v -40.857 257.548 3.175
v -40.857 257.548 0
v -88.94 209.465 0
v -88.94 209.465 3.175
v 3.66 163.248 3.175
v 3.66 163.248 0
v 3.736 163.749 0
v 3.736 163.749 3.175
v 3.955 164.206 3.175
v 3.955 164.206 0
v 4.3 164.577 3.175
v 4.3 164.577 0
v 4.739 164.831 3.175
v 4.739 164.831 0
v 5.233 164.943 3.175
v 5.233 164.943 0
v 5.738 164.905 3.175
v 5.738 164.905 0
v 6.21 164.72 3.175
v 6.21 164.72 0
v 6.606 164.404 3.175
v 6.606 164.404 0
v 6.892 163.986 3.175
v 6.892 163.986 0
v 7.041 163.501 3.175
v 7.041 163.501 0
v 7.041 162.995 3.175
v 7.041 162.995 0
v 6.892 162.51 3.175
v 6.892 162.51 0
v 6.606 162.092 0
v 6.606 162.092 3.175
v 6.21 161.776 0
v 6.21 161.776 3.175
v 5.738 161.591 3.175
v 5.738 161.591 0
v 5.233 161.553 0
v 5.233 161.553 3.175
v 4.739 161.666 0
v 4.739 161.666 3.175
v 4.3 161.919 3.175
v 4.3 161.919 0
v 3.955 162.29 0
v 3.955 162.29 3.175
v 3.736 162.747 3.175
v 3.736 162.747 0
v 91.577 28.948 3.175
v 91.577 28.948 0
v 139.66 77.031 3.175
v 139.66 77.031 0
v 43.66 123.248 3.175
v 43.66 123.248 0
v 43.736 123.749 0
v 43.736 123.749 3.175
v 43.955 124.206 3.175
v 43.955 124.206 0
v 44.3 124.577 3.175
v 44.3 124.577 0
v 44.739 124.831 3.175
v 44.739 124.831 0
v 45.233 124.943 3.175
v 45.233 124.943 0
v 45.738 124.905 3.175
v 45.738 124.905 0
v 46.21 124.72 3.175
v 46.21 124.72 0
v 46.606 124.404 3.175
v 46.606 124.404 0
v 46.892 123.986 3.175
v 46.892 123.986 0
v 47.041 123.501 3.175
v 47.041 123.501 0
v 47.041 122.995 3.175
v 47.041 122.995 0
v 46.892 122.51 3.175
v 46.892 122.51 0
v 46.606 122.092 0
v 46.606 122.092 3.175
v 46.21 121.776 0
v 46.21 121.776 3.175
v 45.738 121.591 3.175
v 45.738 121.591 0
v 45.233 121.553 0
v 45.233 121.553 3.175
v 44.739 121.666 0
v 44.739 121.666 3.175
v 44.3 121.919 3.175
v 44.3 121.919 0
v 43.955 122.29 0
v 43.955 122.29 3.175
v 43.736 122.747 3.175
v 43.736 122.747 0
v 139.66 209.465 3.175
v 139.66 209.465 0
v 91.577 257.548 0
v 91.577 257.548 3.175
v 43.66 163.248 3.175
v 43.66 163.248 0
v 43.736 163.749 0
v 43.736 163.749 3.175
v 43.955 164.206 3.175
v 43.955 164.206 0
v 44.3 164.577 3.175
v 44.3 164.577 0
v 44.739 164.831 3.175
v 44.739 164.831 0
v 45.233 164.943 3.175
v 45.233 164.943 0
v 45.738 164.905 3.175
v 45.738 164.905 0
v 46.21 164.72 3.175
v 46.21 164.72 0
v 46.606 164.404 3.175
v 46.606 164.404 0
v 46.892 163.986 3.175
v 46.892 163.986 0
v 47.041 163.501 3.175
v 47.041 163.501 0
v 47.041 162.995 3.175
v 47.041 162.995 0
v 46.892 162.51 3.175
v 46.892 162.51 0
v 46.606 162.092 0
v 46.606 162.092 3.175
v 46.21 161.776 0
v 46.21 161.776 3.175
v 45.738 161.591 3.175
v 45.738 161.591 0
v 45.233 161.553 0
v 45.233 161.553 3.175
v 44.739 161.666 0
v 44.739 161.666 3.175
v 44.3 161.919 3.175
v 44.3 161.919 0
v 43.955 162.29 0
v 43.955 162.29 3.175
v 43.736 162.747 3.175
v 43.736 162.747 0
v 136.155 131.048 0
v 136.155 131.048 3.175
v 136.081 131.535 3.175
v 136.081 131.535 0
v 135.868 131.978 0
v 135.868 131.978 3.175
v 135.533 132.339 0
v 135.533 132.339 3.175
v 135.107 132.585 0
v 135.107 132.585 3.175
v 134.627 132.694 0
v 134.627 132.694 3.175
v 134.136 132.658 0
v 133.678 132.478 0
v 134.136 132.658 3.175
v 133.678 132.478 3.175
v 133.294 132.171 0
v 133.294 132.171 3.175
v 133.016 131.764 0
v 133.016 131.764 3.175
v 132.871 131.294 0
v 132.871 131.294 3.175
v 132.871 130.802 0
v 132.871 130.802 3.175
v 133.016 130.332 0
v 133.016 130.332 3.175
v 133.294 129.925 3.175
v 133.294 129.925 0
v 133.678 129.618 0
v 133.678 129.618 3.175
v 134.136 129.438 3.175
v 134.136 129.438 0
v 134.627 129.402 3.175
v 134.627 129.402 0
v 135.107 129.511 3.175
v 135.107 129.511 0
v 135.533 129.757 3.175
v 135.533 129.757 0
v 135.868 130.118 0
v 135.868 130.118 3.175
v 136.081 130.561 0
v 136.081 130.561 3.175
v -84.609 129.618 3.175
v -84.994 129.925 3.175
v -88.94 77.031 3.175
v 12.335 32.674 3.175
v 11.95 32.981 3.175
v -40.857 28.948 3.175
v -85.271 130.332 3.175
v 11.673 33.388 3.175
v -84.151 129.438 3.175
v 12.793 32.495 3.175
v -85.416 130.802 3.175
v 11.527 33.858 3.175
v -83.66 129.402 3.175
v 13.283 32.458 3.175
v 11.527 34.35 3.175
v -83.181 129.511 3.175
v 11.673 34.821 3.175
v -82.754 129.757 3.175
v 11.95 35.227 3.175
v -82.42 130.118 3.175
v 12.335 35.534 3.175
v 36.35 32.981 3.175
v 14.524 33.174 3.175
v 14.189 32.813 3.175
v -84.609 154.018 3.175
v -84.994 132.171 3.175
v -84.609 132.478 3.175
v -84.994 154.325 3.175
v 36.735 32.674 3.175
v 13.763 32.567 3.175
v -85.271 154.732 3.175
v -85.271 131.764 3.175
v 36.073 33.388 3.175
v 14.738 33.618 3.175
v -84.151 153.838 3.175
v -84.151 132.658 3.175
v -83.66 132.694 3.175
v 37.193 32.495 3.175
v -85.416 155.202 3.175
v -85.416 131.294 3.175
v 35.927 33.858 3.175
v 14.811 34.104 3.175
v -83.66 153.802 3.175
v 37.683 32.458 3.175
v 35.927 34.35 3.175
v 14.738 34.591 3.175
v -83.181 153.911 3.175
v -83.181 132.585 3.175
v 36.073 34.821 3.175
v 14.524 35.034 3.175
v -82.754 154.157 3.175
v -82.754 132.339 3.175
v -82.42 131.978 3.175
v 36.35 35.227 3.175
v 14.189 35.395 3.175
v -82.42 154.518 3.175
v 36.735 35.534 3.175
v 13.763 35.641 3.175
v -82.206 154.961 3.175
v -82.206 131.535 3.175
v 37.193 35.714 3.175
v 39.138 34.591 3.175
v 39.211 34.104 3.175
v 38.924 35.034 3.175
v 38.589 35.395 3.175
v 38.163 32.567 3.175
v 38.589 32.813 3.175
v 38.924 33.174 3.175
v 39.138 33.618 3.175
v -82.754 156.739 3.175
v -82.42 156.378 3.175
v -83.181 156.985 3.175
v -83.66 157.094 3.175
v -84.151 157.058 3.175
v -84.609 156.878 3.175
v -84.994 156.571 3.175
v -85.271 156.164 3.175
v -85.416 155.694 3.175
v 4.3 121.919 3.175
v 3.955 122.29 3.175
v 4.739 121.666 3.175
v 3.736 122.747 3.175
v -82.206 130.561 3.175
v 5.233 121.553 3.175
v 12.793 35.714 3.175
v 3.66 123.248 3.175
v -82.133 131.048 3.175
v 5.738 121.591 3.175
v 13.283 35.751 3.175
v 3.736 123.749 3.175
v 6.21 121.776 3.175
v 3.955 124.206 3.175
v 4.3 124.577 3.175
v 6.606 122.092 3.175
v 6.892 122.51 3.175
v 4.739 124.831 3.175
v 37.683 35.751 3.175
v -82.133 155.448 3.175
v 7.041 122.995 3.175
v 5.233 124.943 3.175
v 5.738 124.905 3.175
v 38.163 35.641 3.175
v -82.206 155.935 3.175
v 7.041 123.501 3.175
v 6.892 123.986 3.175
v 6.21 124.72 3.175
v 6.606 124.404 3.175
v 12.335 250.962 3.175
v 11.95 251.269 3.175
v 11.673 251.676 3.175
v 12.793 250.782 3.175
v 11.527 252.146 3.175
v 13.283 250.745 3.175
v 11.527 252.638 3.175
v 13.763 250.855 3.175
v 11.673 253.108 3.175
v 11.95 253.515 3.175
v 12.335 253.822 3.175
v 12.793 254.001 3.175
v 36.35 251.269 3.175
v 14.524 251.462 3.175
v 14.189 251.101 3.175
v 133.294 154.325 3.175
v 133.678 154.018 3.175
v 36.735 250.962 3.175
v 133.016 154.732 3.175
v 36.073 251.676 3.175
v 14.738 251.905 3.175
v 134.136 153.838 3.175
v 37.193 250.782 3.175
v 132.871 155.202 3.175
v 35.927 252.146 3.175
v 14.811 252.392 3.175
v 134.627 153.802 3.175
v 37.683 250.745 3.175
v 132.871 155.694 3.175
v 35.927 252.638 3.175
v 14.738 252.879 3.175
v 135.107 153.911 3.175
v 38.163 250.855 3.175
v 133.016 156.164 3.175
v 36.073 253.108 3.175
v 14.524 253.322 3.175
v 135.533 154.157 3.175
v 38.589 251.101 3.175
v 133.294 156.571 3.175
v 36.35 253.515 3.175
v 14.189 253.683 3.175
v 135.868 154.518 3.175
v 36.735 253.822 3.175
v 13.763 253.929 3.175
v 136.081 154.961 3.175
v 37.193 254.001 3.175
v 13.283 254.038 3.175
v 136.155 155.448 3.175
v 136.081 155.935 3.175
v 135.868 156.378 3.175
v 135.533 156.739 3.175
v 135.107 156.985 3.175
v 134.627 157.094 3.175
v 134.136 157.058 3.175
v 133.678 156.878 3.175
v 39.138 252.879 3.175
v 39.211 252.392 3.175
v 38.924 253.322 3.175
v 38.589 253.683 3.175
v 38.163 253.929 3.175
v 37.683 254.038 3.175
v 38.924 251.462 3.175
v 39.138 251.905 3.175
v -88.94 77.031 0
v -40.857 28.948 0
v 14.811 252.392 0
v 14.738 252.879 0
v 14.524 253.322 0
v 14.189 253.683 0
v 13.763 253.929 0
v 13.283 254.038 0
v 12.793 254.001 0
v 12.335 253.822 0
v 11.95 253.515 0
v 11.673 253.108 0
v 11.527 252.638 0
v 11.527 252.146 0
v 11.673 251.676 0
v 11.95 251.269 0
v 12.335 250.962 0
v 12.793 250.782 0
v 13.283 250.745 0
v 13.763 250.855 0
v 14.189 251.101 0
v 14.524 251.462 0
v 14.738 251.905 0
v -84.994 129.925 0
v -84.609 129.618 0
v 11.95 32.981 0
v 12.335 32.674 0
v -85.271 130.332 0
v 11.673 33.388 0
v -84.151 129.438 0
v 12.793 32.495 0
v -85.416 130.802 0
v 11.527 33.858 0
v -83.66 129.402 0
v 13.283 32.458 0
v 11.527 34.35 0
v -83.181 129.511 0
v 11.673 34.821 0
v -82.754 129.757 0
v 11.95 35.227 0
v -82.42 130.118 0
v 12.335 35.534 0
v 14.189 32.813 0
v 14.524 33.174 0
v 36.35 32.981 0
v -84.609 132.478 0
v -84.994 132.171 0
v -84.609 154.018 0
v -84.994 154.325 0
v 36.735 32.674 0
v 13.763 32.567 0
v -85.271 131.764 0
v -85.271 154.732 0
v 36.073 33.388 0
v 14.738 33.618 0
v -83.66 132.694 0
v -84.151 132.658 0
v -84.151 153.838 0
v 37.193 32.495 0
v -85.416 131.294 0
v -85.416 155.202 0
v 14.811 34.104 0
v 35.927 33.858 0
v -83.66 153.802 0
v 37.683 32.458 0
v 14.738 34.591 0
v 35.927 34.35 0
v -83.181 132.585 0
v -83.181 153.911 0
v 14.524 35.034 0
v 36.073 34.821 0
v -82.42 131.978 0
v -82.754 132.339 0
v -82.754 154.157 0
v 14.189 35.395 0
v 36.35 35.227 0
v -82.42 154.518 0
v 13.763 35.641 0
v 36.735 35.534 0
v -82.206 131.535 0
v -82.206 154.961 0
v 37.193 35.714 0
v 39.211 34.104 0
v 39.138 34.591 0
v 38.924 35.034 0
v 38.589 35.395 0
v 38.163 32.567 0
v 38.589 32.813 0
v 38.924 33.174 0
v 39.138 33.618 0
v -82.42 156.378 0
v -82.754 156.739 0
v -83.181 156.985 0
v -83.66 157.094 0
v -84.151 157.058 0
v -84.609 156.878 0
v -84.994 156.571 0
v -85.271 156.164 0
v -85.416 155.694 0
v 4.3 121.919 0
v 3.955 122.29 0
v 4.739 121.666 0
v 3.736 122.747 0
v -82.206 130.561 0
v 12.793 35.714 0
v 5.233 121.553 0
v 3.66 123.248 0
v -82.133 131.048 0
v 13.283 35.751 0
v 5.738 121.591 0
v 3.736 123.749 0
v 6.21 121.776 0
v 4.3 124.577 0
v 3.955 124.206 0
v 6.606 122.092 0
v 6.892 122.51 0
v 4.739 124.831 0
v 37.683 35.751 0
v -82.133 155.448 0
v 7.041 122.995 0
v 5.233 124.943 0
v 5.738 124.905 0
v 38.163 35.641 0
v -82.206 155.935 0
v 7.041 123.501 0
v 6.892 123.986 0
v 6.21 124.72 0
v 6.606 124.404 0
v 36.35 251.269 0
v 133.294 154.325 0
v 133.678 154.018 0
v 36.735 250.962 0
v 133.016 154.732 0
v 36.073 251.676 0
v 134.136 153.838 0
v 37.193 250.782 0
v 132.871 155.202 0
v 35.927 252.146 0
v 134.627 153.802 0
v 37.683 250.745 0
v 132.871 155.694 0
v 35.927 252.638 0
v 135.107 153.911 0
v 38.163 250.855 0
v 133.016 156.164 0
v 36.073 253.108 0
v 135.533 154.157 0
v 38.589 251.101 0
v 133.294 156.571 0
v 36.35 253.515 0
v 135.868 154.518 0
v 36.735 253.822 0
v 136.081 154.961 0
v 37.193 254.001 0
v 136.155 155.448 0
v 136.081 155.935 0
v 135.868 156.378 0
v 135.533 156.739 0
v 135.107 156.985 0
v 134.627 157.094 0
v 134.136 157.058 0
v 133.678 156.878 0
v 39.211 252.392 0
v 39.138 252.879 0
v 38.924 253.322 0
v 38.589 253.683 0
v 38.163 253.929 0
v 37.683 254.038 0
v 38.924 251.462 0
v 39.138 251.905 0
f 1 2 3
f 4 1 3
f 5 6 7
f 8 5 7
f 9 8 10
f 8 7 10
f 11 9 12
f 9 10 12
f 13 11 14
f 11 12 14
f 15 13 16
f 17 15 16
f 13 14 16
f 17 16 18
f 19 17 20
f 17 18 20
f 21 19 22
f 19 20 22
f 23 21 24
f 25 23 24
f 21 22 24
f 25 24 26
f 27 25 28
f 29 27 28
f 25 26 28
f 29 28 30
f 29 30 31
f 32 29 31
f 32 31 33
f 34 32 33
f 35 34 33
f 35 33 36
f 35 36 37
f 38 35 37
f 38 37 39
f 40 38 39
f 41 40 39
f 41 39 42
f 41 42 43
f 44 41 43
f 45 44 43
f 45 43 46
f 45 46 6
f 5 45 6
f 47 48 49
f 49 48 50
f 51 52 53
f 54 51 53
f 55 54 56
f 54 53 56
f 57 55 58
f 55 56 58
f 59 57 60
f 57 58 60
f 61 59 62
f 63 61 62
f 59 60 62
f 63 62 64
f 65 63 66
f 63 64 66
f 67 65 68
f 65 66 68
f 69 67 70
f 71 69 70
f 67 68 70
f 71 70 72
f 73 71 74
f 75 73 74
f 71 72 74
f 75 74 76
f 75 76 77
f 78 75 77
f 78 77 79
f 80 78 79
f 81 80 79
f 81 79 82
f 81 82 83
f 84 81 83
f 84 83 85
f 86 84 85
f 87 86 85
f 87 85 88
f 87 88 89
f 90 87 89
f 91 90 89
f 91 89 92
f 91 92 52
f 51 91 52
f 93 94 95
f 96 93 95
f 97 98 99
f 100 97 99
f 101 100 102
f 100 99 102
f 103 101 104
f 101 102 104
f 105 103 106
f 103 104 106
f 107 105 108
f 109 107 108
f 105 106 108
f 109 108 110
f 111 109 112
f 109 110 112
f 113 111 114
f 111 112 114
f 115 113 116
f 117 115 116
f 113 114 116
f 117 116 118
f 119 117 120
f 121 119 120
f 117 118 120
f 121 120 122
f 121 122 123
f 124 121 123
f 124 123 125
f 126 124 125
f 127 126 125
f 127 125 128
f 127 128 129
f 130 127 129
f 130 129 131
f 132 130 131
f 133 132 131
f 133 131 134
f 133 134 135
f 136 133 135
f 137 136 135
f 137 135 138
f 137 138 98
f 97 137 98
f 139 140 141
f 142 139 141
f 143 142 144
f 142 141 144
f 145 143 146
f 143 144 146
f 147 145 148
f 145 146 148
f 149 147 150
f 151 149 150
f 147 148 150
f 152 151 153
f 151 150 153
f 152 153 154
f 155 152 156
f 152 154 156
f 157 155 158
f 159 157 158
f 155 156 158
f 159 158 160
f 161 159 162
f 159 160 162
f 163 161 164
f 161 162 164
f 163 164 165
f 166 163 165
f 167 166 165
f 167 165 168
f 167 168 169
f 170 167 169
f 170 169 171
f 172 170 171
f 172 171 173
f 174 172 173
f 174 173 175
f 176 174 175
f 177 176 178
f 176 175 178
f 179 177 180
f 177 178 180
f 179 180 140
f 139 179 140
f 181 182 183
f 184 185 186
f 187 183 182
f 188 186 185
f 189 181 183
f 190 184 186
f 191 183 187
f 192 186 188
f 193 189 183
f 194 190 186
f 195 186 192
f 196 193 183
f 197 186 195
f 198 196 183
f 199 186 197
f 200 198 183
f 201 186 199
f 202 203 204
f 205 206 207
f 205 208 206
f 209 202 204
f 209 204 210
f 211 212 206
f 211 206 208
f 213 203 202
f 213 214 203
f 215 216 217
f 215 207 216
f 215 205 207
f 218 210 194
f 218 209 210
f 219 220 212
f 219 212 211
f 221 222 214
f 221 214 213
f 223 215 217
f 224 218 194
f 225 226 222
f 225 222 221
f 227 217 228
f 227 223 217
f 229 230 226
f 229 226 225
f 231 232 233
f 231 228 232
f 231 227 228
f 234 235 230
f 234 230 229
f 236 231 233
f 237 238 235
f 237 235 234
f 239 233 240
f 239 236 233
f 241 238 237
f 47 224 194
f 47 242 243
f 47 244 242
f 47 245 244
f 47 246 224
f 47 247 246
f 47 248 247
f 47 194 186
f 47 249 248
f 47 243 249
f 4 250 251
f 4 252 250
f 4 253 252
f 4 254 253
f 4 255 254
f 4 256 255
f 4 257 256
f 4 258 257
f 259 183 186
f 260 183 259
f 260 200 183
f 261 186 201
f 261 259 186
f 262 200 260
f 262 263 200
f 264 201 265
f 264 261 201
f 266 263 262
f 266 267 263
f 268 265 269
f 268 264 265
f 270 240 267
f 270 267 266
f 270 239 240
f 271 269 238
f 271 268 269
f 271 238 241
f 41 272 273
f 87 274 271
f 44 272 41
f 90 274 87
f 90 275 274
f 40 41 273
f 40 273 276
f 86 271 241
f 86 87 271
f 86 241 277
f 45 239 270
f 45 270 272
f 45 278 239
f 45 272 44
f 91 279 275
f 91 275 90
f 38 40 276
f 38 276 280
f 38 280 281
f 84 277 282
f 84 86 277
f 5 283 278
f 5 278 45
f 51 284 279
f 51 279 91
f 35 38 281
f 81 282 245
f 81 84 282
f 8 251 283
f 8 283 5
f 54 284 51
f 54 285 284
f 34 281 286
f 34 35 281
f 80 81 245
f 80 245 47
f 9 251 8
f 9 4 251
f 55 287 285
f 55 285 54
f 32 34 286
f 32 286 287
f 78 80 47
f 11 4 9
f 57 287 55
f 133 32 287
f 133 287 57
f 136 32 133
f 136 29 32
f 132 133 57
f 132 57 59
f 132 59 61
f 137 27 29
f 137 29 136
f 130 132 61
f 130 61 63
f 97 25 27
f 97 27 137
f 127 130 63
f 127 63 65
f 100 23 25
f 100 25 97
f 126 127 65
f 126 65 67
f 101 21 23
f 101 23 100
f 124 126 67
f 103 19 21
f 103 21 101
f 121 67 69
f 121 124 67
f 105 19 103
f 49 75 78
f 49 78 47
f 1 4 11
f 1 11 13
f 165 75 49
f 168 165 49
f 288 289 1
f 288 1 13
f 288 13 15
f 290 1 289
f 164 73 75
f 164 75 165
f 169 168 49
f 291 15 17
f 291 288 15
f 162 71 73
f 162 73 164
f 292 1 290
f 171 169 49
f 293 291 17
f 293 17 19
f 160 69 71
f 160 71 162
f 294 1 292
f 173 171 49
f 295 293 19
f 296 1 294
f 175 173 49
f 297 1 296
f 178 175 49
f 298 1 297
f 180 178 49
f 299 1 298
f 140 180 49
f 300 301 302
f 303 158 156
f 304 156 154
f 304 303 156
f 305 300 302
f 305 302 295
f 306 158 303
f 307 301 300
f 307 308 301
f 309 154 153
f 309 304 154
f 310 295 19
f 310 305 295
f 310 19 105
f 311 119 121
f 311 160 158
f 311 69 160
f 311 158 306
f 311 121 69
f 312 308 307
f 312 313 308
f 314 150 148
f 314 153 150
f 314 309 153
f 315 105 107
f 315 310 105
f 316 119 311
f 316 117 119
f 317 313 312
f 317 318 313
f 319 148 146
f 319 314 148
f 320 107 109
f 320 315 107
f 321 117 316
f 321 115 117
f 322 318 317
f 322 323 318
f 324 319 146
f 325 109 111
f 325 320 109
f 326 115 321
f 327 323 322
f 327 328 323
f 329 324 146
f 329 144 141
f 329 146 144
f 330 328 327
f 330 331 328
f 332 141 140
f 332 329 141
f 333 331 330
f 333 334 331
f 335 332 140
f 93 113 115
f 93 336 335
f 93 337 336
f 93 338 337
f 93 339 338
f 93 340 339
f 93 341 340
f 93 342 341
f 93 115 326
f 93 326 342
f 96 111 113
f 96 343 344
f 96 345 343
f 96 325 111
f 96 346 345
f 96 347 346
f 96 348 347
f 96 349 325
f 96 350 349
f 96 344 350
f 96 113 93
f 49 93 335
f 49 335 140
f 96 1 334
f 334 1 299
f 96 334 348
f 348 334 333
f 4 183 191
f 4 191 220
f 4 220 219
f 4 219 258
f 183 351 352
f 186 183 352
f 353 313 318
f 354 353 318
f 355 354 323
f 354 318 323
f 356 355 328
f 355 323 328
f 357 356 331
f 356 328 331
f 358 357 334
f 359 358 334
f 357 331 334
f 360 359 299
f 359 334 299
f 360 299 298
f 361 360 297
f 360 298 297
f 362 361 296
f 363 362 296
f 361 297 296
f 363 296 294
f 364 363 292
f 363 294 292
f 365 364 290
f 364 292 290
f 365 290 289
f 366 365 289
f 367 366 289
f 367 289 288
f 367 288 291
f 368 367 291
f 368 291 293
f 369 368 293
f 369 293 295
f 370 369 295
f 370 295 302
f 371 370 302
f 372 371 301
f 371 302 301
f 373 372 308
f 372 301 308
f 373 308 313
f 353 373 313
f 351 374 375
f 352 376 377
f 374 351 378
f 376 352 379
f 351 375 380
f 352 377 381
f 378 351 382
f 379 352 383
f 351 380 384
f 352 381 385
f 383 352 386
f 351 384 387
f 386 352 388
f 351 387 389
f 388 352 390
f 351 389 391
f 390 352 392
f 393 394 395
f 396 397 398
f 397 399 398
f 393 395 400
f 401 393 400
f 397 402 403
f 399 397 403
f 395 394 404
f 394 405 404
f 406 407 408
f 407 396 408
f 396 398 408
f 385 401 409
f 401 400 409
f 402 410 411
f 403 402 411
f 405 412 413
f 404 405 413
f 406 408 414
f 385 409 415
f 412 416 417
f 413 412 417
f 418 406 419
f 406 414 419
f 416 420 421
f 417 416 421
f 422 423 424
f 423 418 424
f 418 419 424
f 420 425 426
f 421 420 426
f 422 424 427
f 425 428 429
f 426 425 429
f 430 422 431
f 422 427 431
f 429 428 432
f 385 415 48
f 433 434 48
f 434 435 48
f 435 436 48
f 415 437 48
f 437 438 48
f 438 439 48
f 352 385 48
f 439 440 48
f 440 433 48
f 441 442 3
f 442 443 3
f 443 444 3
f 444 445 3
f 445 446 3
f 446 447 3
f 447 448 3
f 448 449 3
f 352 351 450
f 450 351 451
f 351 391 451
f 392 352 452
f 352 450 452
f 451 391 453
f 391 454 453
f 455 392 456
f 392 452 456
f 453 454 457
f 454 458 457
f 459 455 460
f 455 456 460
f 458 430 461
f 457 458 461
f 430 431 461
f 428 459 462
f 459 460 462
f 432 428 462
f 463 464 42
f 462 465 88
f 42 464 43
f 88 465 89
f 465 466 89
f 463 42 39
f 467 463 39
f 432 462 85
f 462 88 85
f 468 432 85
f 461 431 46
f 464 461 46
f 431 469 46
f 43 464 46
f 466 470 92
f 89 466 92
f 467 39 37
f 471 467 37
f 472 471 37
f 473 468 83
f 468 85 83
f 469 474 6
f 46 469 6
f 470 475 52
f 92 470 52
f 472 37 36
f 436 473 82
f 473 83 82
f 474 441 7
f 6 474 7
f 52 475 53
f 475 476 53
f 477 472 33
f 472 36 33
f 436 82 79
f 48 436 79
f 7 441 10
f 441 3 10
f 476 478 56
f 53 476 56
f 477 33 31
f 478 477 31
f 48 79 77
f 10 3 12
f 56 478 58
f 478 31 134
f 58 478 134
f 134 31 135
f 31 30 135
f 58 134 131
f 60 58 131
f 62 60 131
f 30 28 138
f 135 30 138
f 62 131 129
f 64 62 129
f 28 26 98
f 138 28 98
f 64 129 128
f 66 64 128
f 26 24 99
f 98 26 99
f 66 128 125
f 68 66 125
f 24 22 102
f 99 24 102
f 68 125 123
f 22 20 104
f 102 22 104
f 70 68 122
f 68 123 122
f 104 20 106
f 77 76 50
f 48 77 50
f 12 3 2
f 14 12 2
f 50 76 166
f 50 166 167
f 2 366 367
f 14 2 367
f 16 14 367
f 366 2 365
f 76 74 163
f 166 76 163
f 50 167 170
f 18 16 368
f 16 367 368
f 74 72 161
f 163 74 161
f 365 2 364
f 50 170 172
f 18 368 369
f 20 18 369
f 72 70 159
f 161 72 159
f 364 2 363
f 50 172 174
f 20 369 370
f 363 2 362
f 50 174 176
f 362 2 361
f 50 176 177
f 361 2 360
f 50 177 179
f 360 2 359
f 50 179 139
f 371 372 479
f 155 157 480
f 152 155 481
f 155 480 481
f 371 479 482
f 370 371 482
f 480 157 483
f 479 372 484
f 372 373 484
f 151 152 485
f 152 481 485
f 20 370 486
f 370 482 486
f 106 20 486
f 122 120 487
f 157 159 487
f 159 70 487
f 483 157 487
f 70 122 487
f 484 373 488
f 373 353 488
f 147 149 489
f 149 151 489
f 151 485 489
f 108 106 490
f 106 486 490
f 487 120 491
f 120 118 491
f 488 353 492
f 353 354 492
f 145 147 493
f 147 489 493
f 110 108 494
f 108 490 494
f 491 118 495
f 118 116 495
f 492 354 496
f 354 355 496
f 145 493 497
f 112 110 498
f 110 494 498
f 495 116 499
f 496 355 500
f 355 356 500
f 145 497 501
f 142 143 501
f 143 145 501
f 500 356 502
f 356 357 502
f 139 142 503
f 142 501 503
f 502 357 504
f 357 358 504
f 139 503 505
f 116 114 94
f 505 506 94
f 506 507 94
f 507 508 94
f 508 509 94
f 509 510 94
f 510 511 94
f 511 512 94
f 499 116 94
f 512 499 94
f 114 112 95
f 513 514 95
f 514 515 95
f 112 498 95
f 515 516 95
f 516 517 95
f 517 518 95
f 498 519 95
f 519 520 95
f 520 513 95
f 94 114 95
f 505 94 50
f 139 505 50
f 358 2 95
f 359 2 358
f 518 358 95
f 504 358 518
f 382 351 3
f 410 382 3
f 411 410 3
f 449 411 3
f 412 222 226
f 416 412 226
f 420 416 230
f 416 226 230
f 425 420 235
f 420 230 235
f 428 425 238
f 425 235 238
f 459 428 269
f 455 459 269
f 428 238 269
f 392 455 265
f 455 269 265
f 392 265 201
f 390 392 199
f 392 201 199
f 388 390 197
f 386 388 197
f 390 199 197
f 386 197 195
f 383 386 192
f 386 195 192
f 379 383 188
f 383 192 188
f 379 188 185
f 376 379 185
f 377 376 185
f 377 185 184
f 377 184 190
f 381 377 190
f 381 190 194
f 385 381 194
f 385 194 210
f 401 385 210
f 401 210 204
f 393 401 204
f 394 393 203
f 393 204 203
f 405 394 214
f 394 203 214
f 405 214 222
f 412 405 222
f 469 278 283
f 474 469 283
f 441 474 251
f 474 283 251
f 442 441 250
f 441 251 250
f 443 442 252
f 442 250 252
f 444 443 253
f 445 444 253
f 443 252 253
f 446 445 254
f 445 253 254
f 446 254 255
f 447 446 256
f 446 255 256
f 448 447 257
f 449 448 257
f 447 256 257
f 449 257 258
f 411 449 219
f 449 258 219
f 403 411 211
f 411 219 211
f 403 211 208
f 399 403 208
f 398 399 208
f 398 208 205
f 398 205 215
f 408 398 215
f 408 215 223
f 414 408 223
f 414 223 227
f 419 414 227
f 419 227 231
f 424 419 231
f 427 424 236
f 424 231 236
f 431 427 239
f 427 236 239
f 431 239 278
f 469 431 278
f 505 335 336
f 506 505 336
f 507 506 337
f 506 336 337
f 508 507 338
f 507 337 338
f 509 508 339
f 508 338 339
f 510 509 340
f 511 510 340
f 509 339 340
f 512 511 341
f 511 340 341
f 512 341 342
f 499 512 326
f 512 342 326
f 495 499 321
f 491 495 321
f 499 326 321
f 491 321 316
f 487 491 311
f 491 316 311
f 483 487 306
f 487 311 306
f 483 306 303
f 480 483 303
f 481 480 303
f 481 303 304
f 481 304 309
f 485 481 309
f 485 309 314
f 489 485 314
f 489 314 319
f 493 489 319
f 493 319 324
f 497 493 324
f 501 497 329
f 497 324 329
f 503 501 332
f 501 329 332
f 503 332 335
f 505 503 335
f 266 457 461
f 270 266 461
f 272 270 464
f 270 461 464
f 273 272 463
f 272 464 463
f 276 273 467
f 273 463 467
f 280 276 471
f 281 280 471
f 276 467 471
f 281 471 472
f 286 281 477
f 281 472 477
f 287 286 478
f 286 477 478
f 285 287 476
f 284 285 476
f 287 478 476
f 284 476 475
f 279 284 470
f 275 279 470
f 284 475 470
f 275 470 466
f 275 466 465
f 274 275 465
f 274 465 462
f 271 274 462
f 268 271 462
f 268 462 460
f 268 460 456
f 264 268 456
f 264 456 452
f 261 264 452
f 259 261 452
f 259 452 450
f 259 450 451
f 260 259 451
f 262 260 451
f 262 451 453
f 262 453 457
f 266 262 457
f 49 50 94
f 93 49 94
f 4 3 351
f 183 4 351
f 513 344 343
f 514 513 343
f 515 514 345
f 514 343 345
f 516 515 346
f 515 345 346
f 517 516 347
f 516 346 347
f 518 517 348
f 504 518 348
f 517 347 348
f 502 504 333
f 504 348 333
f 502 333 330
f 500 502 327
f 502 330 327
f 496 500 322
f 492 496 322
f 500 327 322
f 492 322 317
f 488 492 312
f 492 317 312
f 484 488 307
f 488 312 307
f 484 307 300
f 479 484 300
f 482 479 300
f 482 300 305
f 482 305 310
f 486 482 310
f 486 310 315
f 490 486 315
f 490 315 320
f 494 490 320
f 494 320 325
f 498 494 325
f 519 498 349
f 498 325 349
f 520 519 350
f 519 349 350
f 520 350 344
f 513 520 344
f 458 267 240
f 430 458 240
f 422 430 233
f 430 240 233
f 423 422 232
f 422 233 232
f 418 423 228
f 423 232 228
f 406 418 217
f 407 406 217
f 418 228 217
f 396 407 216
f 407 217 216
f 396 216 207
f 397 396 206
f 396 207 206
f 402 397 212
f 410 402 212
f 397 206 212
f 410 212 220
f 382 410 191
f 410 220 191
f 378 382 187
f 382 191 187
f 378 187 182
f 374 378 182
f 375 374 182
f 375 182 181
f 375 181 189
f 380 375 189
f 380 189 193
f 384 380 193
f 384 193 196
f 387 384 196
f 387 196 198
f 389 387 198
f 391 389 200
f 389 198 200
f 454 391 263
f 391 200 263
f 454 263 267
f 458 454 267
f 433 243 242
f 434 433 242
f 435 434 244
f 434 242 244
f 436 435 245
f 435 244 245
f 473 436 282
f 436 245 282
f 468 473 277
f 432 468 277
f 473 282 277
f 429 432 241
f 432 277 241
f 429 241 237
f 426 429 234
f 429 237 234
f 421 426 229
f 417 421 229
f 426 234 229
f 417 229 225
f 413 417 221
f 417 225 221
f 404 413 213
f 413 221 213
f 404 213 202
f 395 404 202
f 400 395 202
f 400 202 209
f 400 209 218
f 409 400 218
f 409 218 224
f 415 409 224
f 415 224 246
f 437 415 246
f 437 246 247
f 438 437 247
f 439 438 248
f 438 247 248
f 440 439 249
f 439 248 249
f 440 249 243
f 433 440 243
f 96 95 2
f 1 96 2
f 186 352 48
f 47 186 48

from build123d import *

# Parameters (mm, degrees)
BOSS_EXTRUDE1_DEPTH  = 3.175
M3_CLEARANCE_HOLE1_D = 3.4
SKETCH6_R            = 1.651
CUT_EXTRUDE1_DEPTH   = 3.175


with BuildPart() as part:
    # Sketch1 → Boss-Extrude1 (new body)
    with BuildSketch(Plane.XY):
        Polygon((-88.939961868, 77.031330301), (-40.856700747, 28.948069181), (91.576777011, 28.948069181), (139.660038132, 77.031330301), (139.660038132, 209.46480806), (91.576777011, 257.548069181), (-40.856700747, 257.548069181), (-88.939961868, 209.46480806), align=None)
    extrude(amount=BOSS_EXTRUDE1_DEPTH)

    # M3 Clearance Hole1 (through all)
    with Locations(Plane.XY.offset(3.175)):
        with Locations((5.360038132, 163.248069181), (45.360038132, 123.248069181), (45.360038132, 163.248069181), (5.360038132, 123.248069181)):
            Hole(M3_CLEARANCE_HOLE1_D / 2)

    # Sketch6 → Cut-Extrude1 (cut)
    with BuildSketch(Plane.XY.offset(3.175)):
        with Locations((37.560038132, 252.391869181)):
            Circle(SKETCH6_R)
        with Locations((13.160038132, 252.391869181)):
            Circle(SKETCH6_R)
        with Locations((-83.783761868, 155.448069181)):
            Circle(SKETCH6_R)
        with Locations((-83.783761868, 131.048069181)):
            Circle(SKETCH6_R)
        with Locations((13.160038132, 34.104269181)):
            Circle(SKETCH6_R)
        with Locations((37.560038132, 34.104269181)):
            Circle(SKETCH6_R)
        with Locations((134.503838132, 131.048069181)):
            Circle(SKETCH6_R)
        with Locations((134.503838132, 155.448069181)):
            Circle(SKETCH6_R)
    extrude(amount=-CUT_EXTRUDE1_DEPTH, mode=Mode.SUBTRACT)


solid = part.part
